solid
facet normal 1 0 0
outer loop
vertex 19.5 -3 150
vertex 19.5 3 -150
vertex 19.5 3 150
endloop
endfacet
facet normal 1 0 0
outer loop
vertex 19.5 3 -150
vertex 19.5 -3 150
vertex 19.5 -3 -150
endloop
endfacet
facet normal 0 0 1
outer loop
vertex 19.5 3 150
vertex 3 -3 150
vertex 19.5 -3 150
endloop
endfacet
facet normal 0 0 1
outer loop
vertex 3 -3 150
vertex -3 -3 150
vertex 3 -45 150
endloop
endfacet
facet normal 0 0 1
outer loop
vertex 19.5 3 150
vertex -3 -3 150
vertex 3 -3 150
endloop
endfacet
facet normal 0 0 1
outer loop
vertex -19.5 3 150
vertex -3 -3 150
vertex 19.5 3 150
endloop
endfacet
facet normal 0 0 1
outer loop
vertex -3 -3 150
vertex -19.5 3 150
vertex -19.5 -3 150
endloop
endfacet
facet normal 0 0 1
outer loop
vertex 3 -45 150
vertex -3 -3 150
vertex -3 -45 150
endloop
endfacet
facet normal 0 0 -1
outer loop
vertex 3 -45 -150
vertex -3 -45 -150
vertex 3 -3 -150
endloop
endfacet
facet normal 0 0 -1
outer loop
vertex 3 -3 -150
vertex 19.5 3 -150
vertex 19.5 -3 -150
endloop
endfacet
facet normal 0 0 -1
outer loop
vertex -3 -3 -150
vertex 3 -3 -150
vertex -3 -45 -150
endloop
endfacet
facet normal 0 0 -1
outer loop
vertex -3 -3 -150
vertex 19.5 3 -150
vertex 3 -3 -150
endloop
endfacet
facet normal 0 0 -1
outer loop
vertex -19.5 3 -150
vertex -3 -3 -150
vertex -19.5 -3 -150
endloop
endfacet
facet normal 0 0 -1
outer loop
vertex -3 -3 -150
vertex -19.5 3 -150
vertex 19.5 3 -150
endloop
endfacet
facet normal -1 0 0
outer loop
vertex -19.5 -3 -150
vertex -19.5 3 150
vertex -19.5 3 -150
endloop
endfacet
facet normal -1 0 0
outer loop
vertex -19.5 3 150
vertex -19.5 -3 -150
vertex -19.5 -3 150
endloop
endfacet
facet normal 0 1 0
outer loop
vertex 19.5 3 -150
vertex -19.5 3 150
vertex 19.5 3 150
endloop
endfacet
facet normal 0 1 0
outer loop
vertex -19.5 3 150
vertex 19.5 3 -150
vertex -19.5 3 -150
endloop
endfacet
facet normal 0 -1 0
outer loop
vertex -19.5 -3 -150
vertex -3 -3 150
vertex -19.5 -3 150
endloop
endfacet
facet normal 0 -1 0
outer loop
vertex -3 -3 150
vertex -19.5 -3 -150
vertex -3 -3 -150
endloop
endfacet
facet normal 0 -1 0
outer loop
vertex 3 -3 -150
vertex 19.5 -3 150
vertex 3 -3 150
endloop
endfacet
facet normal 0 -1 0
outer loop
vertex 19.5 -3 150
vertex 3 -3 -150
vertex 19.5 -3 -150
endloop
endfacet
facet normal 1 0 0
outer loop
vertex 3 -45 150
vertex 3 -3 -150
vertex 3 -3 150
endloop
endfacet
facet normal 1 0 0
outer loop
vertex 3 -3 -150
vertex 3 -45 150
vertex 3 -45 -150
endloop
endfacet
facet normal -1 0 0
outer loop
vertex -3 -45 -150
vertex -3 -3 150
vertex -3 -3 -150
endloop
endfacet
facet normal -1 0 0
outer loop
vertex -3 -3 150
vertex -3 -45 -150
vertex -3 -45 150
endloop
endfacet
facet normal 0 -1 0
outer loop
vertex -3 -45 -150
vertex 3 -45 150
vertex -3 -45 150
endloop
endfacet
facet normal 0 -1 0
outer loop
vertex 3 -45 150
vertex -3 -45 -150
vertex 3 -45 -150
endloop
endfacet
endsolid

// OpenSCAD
module Beam_T(par,Len = 1000){

//Every Beam is defined by: b (size), h (height) and a(thickness)

Paramet = [[45,45,6,5],[20,30,40]];   // b,h and a

b = Paramet[par][0];
h = Paramet[par][1];
a = Paramet[par][2];

// echo(Tabi[Paramet][2]);
echo(b);
 
color("#CCCCCC"){
cube([h-a,a,Len], center =true);

translate([0,-h/2,0])
cube([a,b,Len], center =true);

        }
    }

Beam_T(0, Len = 300);
